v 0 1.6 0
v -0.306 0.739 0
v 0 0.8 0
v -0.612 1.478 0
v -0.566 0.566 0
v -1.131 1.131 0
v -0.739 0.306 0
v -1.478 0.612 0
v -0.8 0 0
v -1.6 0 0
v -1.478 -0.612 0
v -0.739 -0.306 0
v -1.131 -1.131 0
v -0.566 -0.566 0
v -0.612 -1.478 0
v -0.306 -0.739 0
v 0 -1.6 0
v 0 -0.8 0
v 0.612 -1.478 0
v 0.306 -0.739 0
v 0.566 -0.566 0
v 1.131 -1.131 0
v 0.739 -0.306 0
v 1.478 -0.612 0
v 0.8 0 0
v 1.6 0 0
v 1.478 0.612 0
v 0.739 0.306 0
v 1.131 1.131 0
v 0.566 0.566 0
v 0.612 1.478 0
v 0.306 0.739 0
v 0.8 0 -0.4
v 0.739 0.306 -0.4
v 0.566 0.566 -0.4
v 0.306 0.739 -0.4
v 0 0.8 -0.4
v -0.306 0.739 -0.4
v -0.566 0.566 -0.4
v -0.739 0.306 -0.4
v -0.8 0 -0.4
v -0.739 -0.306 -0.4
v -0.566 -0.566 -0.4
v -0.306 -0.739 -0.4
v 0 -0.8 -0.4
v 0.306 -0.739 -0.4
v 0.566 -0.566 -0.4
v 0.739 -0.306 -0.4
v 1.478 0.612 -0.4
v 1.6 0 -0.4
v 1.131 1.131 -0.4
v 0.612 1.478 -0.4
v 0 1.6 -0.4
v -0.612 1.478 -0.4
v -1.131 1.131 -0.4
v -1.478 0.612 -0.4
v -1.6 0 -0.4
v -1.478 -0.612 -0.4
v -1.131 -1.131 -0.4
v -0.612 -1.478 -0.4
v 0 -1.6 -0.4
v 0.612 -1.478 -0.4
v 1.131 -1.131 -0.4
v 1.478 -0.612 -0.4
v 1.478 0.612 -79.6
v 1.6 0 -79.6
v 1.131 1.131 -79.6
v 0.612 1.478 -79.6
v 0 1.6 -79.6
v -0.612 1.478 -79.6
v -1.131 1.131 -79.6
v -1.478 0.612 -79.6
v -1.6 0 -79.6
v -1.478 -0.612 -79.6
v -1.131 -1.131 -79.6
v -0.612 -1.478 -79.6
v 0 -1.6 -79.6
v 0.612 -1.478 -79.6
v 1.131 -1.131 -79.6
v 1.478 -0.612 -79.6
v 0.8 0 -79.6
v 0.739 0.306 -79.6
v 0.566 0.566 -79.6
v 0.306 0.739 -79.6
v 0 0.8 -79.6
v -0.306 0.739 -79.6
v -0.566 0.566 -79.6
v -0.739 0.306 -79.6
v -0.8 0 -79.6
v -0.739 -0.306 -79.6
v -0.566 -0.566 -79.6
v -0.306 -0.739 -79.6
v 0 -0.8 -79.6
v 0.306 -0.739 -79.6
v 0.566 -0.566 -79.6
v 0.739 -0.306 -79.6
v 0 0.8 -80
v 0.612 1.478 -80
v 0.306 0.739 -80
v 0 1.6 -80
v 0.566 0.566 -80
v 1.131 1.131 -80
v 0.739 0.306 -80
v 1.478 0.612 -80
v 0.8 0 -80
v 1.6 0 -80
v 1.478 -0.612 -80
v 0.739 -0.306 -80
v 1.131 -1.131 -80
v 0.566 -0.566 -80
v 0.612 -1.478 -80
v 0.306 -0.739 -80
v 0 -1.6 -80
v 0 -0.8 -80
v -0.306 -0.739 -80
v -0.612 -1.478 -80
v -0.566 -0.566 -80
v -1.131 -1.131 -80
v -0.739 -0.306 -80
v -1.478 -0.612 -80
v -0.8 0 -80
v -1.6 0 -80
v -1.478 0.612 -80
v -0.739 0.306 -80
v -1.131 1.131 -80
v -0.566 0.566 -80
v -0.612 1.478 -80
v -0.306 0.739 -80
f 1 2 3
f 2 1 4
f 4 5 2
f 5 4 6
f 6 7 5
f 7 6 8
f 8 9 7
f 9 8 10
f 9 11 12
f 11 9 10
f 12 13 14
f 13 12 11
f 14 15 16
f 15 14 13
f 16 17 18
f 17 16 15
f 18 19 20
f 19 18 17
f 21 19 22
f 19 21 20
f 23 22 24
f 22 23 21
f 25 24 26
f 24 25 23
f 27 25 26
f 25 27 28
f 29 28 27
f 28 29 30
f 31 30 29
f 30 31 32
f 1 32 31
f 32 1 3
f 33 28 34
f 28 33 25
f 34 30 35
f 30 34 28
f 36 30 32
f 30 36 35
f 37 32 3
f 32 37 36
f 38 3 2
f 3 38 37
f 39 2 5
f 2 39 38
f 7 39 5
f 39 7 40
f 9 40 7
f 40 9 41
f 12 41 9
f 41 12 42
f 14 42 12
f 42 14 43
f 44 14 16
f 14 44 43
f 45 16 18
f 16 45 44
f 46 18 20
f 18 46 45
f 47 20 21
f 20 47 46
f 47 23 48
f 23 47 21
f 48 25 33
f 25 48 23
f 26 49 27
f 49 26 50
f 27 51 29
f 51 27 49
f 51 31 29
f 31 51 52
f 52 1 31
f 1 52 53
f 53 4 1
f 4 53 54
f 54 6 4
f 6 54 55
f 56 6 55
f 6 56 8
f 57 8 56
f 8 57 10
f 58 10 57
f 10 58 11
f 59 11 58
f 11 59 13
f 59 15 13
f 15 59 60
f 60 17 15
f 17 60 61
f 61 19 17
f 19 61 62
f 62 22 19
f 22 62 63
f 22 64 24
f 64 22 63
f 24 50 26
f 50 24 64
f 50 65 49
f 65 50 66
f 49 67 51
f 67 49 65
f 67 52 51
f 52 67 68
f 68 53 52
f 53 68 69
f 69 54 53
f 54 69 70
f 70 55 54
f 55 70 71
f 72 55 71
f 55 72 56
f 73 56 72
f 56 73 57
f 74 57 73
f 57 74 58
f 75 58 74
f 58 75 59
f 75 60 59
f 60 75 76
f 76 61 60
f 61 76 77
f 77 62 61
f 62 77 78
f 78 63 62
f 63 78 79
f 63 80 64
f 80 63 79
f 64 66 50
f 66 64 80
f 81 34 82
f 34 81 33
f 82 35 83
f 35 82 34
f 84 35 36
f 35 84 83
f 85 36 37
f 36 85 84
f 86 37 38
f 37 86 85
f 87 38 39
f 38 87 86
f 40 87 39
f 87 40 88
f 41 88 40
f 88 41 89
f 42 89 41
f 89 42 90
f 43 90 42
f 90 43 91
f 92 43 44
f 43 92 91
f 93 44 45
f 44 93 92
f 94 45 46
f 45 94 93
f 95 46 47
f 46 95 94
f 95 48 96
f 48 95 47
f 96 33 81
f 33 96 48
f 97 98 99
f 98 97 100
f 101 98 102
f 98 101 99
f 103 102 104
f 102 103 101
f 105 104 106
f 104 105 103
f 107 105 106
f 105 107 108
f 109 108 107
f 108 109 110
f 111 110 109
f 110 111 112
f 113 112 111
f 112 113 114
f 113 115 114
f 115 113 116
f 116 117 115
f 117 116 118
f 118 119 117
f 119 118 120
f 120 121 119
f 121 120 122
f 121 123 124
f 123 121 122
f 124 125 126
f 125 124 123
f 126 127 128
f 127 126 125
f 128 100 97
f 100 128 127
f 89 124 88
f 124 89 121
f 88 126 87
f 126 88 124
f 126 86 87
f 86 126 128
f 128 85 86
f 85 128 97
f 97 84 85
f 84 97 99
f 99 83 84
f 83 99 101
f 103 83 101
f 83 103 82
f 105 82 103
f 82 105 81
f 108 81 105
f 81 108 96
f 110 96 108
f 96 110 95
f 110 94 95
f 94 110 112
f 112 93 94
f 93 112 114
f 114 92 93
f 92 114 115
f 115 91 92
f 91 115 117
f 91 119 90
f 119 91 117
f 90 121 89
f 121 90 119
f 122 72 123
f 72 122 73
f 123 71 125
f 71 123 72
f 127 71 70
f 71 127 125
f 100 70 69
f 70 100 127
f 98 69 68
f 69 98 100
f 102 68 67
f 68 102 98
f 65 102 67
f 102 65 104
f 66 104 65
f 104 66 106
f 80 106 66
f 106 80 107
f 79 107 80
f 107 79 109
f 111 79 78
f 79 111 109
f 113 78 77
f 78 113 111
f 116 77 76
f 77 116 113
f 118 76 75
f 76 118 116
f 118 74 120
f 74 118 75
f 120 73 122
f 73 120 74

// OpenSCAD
// file: ../p/4-4ring1.scad
use <../lib.scad>
function ldraw_lib__4_4ring1() = [
// 0 Ring  1 x 1.0
// 0 Name: 4-4ring1.dat
// 0 Author: James Jessiman
// 0 !LDRAW_ORG Primitive UPDATE 2009-01
// 0 !LICENSE Licensed under CC BY 4.0 : see CAreadme.txt
// 
// 0 BFC CERTIFY CCW
  [0,"BFC","CERTIFY"],
  [0,"BFC","CCW"],
// 
// 0 !HISTORY 1998-12-15 [PTadmin] Official Update 1998-10
// 0 !HISTORY 2002-04-08 [BrickCaster] Modified for BFC compliance
// 0 !HISTORY 2002-04-25 [PTadmin] Official Update 2002-02
// 0 !HISTORY 2007-06-24 [PTadmin] Header formatted for Contributor Agreement
// 0 !HISTORY 2008-07-01 [PTadmin] Official Update 2008-01
// 0 !HISTORY 2008-08-26 [cwdee] Switch polygon winding and rename
// 0 !HISTORY 2009-05-02 [PTadmin] Official Update 2009-01
// 
// 
// 4 16 -0.7654 0 1.8478 -0.3827 0 0.9239 0 0 1 0 0 2
  [4,16,-0.7654,0,1.8478,-0.3827,0,0.9239,0,0,1,0,0,2],
// 4 16 -1.4142 0 1.4142 -0.7071 0 0.7071 -0.3827 0 0.9239 -0.7654 0 1.8478
  [4,16,-1.4142,0,1.4142,-0.7071,0,0.7071,-0.3827,0,0.9239,-0.7654,0,1.8478],
// 4 16 -1.8478 0 0.7654 -0.9239 0 0.3827 -0.7071 0 0.7071 -1.4142 0 1.41420
  [4,16,-1.8478,0,0.7654,-0.9239,0,0.3827,-0.7071,0,0.7071,-1.4142,0,1.41420],
// 4 16 -2 0 0 -1 0 0 -0.9239 0 0.3827 -1.8478 0 0.7654
  [4,16,-2,0,0,-1,0,0,-0.9239,0,0.3827,-1.8478,0,0.7654],
// 4 16 -1.8478 0 -0.7654 -0.9239 0 -0.3827 -1 0 0 -2 0 0
  [4,16,-1.8478,0,-0.7654,-0.9239,0,-0.3827,-1,0,0,-2,0,0],
// 4 16 -1.4142 0 -1.4142 -0.7071 0 -0.7071 -0.9239 0 -0.3827 -1.8478 0 -0.7654
  [4,16,-1.4142,0,-1.4142,-0.7071,0,-0.7071,-0.9239,0,-0.3827,-1.8478,0,-0.7654],
// 4 16 -0.7654 0 -1.8478 -0.3827 0 -0.9239 -0.7071 0 -0.7071 -1.4142 0 -1.4142
  [4,16,-0.7654,0,-1.8478,-0.3827,0,-0.9239,-0.7071,0,-0.7071,-1.4142,0,-1.4142],
// 4 16 0 0 -2 0 0 -1 -0.3827 0 -0.9239 -0.7654 0 -1.8478
  [4,16,0,0,-2,0,0,-1,-0.3827,0,-0.9239,-0.7654,0,-1.8478],
// 4 16 0.7654 0 -1.8478 0.3827 0 -0.9239 0 0 -1 0 0 -2
  [4,16,0.7654,0,-1.8478,0.3827,0,-0.9239,0,0,-1,0,0,-2],
// 4 16 1.4142 0 -1.4142 0.7071 0 -0.7071 0.3827 0 -0.9239 0.7654 0 -1.8478
  [4,16,1.4142,0,-1.4142,0.7071,0,-0.7071,0.3827,0,-0.9239,0.7654,0,-1.8478],
// 4 16 1.8478 0 -0.7654 0.9239 0 -0.3827 0.7071 0 -0.7071 1.4142 0 -1.4142
  [4,16,1.8478,0,-0.7654,0.9239,0,-0.3827,0.7071,0,-0.7071,1.4142,0,-1.4142],
// 4 16 2 0 0 1 0 0 0.9239 0 -0.3827 1.8478 0 -0.7654
  [4,16,2,0,0,1,0,0,0.9239,0,-0.3827,1.8478,0,-0.7654],
// 4 16 1.8478 0 0.7654 0.9239 0 0.3827 1 0 0 2 0 0
  [4,16,1.8478,0,0.7654,0.9239,0,0.3827,1,0,0,2,0,0],
// 4 16 1.4142 0 1.4142 0.7071 0 0.7071 0.9239 0 0.3827 1.8478 0 0.7654
  [4,16,1.4142,0,1.4142,0.7071,0,0.7071,0.9239,0,0.3827,1.8478,0,0.7654],
// 4 16 0.7654 0 1.8478 0.3827 0 0.9239 0.7071 0 0.7071 1.4142 0 1.4142
  [4,16,0.7654,0,1.8478,0.3827,0,0.9239,0.7071,0,0.7071,1.4142,0,1.4142],
// 4 16 0 0 2 0 0 1 0.3827 0 0.9239 0.7654 0 1.8478
  [4,16,0,0,2,0,0,1,0.3827,0,0.9239,0.7654,0,1.8478],
// 0
];
module ldraw_lib__4_4ring1(step=0, col=false, unit=2/5, alt=false, line=0.2, solid=!$preview)
    makepoly(ldraw_lib__4_4ring1(), step=step, col=col, unit=unit, alt=alt, line=line, solid=solid);
ldraw_lib__4_4ring1(line=0.2);
// file: ../p/4-4edge.scad
use <../lib.scad>
function ldraw_lib__4_4edge() = [
// 0 Circle 1.0
// 0 Name: 4-4edge.dat
// 0 Author: James Jessiman
// 0 !LDRAW_ORG Primitive UPDATE 2017-01
// 0 !LICENSE Licensed under CC BY 4.0 : see CAreadme.txt
// 
// 0 BFC CERTIFY CCW
  [0,"BFC","CERTIFY"],
  [0,"BFC","CCW"],
// 
// 0 !HISTORY 1998-12-15 [PTadmin] Official Update 1998-10
// 0 !HISTORY 2005-12-28 [PTadmin] Official Update 2005-01
// 0 !HISTORY 2007-06-24 [PTadmin] Header formatted for Contributor Agreement
// 0 !HISTORY 2008-07-01 [PTadmin] Official Update 2008-01
// 0 !HISTORY 2017-01-15 [Steffen] BFCed
// 0 !HISTORY 2017-12-30 [PTadmin] Official Update 2017-01
// 
// 
// 2 24 1 0 0 0.9239 0 0.3827
  [2,24,1,0,0,0.9239,0,0.3827],
// 2 24 0.9239 0 0.3827 0.7071 0 0.7071
  [2,24,0.9239,0,0.3827,0.7071,0,0.7071],
// 2 24 0.7071 0 0.7071 0.3827 0 0.9239
  [2,24,0.7071,0,0.7071,0.3827,0,0.9239],
// 2 24 0.3827 0 0.9239 0 0 1
  [2,24,0.3827,0,0.9239,0,0,1],
// 2 24 0 0 1 -0.3827 0 0.9239
  [2,24,0,0,1,-0.3827,0,0.9239],
// 2 24 -0.3827 0 0.9239 -0.7071 0 0.7071
  [2,24,-0.3827,0,0.9239,-0.7071,0,0.7071],
// 2 24 -0.7071 0 0.7071 -0.9239 0 0.3827
  [2,24,-0.7071,0,0.7071,-0.9239,0,0.3827],
// 2 24 -0.9239 0 0.3827 -1 0 -0
  [2,24,-0.9239,0,0.3827,-1,0,-0],
// 2 24 -1 0 -0 -0.9239 0 -0.3827
  [2,24,-1,0,-0,-0.9239,0,-0.3827],
// 2 24 -0.9239 0 -0.3827 -0.7071 0 -0.7071
  [2,24,-0.9239,0,-0.3827,-0.7071,0,-0.7071],
// 2 24 -0.7071 0 -0.7071 -0.3827 0 -0.9239
  [2,24,-0.7071,0,-0.7071,-0.3827,0,-0.9239],
// 2 24 -0.3827 0 -0.9239 0 0 -1
  [2,24,-0.3827,0,-0.9239,0,0,-1],
// 2 24 0 0 -1 0.3827 0 -0.9239
  [2,24,0,0,-1,0.3827,0,-0.9239],
// 2 24 0.3827 0 -0.9239 0.7071 0 -0.7071
  [2,24,0.3827,0,-0.9239,0.7071,0,-0.7071],
// 2 24 0.7071 0 -0.7071 0.9239 0 -0.3827
  [2,24,0.7071,0,-0.7071,0.9239,0,-0.3827],
// 2 24 0.9239 0 -0.3827 1 0 0
  [2,24,0.9239,0,-0.3827,1,0,0],
];
module ldraw_lib__4_4edge(step=0, col=false, unit=2/5, alt=false, line=0.2, solid=!$preview)
    makepoly(ldraw_lib__4_4edge(), step=step, col=col, unit=unit, alt=alt, line=line, solid=solid);
ldraw_lib__4_4edge(line=0.2);
// file: ../p/4-4cyli.scad
use <../lib.scad>
function ldraw_lib__4_4cyli() = [
// 0 Cylinder 1.0
// 0 Name: 4-4cyli.dat
// 0 Author: James Jessiman
// 0 !LDRAW_ORG Primitive UPDATE 2005-01
// 0 !LICENSE Licensed under CC BY 4.0 : see CAreadme.txt
// 
// 0 BFC CERTIFY CCW
  [0,"BFC","CERTIFY"],
  [0,"BFC","CCW"],
// 
// 0 !HISTORY 1998-12-15 [PTadmin] Official Update 1998-10
// 0 !HISTORY 2002-03-23 [sbliss] Added BFC statement; merged headers from files in distributions LDraw 0.27 and Complete.
// 0 !HISTORY 2002-04-25 [PTadmin] Official Update 2002-02
// 0 !HISTORY 2004-12-14 [guyvivan] BFC CCW
// 0 !HISTORY 2005-12-28 [PTadmin] Official Update 2005-01
// 0 !HISTORY 2007-06-24 [PTadmin] Header formatted for Contributor Agreement
// 0 !HISTORY 2008-07-01 [PTadmin] Official Update 2008-01
// 
// 
// 4 16 1 1 0 0.9239 1 0.3827 0.9239 0 0.3827 1 0 0
  [4,16,1,1,0,0.9239,1,0.3827,0.9239,0,0.3827,1,0,0],
// 5 24 1 0 0 1 1 0 0.9239 0 0.3827 0.9239 0 -0.3827
  [5,24,1,0,0,1,1,0,0.9239,0,0.3827,0.9239,0,-0.3827],
// 4 16 0.9239 1 0.3827 0.7071 1 0.7071 0.7071 0 0.7071 0.9239 0 0.3827
  [4,16,0.9239,1,0.3827,0.7071,1,0.7071,0.7071,0,0.7071,0.9239,0,0.3827],
// 5 24 0.9239 0 0.3827 0.9239 1 0.3827 0.7071 0 0.7071 1 0 0
  [5,24,0.9239,0,0.3827,0.9239,1,0.3827,0.7071,0,0.7071,1,0,0],
// 4 16 0.7071 1 0.7071 0.3827 1 0.9239 0.3827 0 0.9239 0.7071 0 0.7071
  [4,16,0.7071,1,0.7071,0.3827,1,0.9239,0.3827,0,0.9239,0.7071,0,0.7071],
// 5 24 0.7071 0 0.7071 0.7071 1 0.7071 0.3827 0 0.9239 0.9239 0 0.3827
  [5,24,0.7071,0,0.7071,0.7071,1,0.7071,0.3827,0,0.9239,0.9239,0,0.3827],
// 4 16 0.3827 1 0.9239 0 1 1 0 0 1 0.3827 0 0.9239
  [4,16,0.3827,1,0.9239,0,1,1,0,0,1,0.3827,0,0.9239],
// 5 24 0.3827 0 0.9239 0.3827 1 0.9239 0 0 1 0.7071 0 0.7071
  [5,24,0.3827,0,0.9239,0.3827,1,0.9239,0,0,1,0.7071,0,0.7071],
// 4 16 0 1 1 -0.3827 1 0.9239 -0.3827 0 0.9239 0 0 1
  [4,16,0,1,1,-0.3827,1,0.9239,-0.3827,0,0.9239,0,0,1],
// 5 24 0 0 1 0 1 1 -0.3827 0 0.9239 0.3827 0 0.9239
  [5,24,0,0,1,0,1,1,-0.3827,0,0.9239,0.3827,0,0.9239],
// 4 16 -0.3827 1 0.9239 -0.7071 1 0.7071 -0.7071 0 0.7071 -0.3827 0 0.9239
  [4,16,-0.3827,1,0.9239,-0.7071,1,0.7071,-0.7071,0,0.7071,-0.3827,0,0.9239],
// 5 24 -0.3827 0 0.9239 -0.3827 1 0.9239 -0.7071 0 0.7071 0 0 1
  [5,24,-0.3827,0,0.9239,-0.3827,1,0.9239,-0.7071,0,0.7071,0,0,1],
// 4 16 -0.7071 1 0.7071 -0.9239 1 0.3827 -0.9239 0 0.3827 -0.7071 0 0.7071
  [4,16,-0.7071,1,0.7071,-0.9239,1,0.3827,-0.9239,0,0.3827,-0.7071,0,0.7071],
// 5 24 -0.7071 0 0.7071 -0.7071 1 0.7071 -0.9239 0 0.3827 -0.3827 0 0.9239
  [5,24,-0.7071,0,0.7071,-0.7071,1,0.7071,-0.9239,0,0.3827,-0.3827,0,0.9239],
// 4 16 -0.9239 1 0.3827 -1 1 0 -1 0 0 -0.9239 0 0.3827
  [4,16,-0.9239,1,0.3827,-1,1,0,-1,0,0,-0.9239,0,0.3827],
// 5 24 -0.9239 0 0.3827 -0.9239 1 0.3827 -1 0 0 -0.7071 0 0.7071
  [5,24,-0.9239,0,0.3827,-0.9239,1,0.3827,-1,0,0,-0.7071,0,0.7071],
// 4 16 -1 1 0 -0.9239 1 -0.3827 -0.9239 0 -0.3827 -1 0 0
  [4,16,-1,1,0,-0.9239,1,-0.3827,-0.9239,0,-0.3827,-1,0,0],
// 5 24 -1 0 0 -1 1 0 -0.9239 0 -0.3827 -0.9239 0 0.3827
  [5,24,-1,0,0,-1,1,0,-0.9239,0,-0.3827,-0.9239,0,0.3827],
// 4 16 -0.9239 1 -0.3827 -0.7071 1 -0.7071 -0.7071 0 -0.7071 -0.9239 0 -0.3827
  [4,16,-0.9239,1,-0.3827,-0.7071,1,-0.7071,-0.7071,0,-0.7071,-0.9239,0,-0.3827],
// 5 24 -0.9239 0 -0.3827 -0.9239 1 -0.3827 -0.7071 0 -0.7071 -1 0 0
  [5,24,-0.9239,0,-0.3827,-0.9239,1,-0.3827,-0.7071,0,-0.7071,-1,0,0],
// 4 16 -0.7071 1 -0.7071 -0.3827 1 -0.9239 -0.3827 0 -0.9239 -0.7071 0 -0.7071
  [4,16,-0.7071,1,-0.7071,-0.3827,1,-0.9239,-0.3827,0,-0.9239,-0.7071,0,-0.7071],
// 5 24 -0.7071 0 -0.7071 -0.7071 1 -0.7071 -0.3827 0 -0.9239 -0.9239 0 -0.3827
  [5,24,-0.7071,0,-0.7071,-0.7071,1,-0.7071,-0.3827,0,-0.9239,-0.9239,0,-0.3827],
// 4 16 -0.3827 1 -0.9239 0 1 -1 0 0 -1 -0.3827 0 -0.9239
  [4,16,-0.3827,1,-0.9239,0,1,-1,0,0,-1,-0.3827,0,-0.9239],
// 5 24 -0.3827 0 -0.9239 -0.3827 1 -0.9239 0 0 -1 -0.7071 0 -0.7071
  [5,24,-0.3827,0,-0.9239,-0.3827,1,-0.9239,0,0,-1,-0.7071,0,-0.7071],
// 4 16 0 1 -1 0.3827 1 -0.9239 0.3827 0 -0.9239 0 0 -1
  [4,16,0,1,-1,0.3827,1,-0.9239,0.3827,0,-0.9239,0,0,-1],
// 5 24 0 0 -1 0 1 -1 0.3827 0 -0.9239 -0.3827 0 -0.9239
  [5,24,0,0,-1,0,1,-1,0.3827,0,-0.9239,-0.3827,0,-0.9239],
// 4 16 0.3827 1 -0.9239 0.7071 1 -0.7071 0.7071 0 -0.7071 0.3827 0 -0.9239
  [4,16,0.3827,1,-0.9239,0.7071,1,-0.7071,0.7071,0,-0.7071,0.3827,0,-0.9239],
// 5 24 0.3827 0 -0.9239 0.3827 1 -0.9239 0.7071 0 -0.7071 0 0 -1
  [5,24,0.3827,0,-0.9239,0.3827,1,-0.9239,0.7071,0,-0.7071,0,0,-1],
// 4 16 0.7071 1 -0.7071 0.9239 1 -0.3827 0.9239 0 -0.3827 0.7071 0 -0.7071
  [4,16,0.7071,1,-0.7071,0.9239,1,-0.3827,0.9239,0,-0.3827,0.7071,0,-0.7071],
// 5 24 0.7071 0 -0.7071 0.7071 1 -0.7071 0.9239 0 -0.3827 0.3827 0 -0.9239
  [5,24,0.7071,0,-0.7071,0.7071,1,-0.7071,0.9239,0,-0.3827,0.3827,0,-0.9239],
// 4 16 0.9239 1 -0.3827 1 1 0 1 0 0 0.9239 0 -0.3827
  [4,16,0.9239,1,-0.3827,1,1,0,1,0,0,0.9239,0,-0.3827],
// 5 24 0.9239 0 -0.3827 0.9239 1 -0.3827 1 0 0 0.7071 0 -0.7071
  [5,24,0.9239,0,-0.3827,0.9239,1,-0.3827,1,0,0,0.7071,0,-0.7071],
// 0
];
module ldraw_lib__4_4cyli(step=0, col=false, unit=2/5, alt=false, line=0.2, solid=!$preview)
    makepoly(ldraw_lib__4_4cyli(), step=step, col=col, unit=unit, alt=alt, line=line, solid=solid);
ldraw_lib__4_4cyli(line=0.2);
// file: u9053.scad
use <../lib.scad>
use <../p/4-4cyli.scad>
use <../p/4-4edge.scad>
use <../p/4-4ring1.scad>
function ldraw_lib__u9053() = [
// 0 ~Technic Flex-System Hose End
// 0 Name: u9053.dat
// 0 Author: William Howard [WilliamH]
// 0 !LDRAW_ORG Part UPDATE 2011-02
// 0 !LICENSE Licensed under CC BY 2.0 and CC BY 4.0 : see CAreadme.txt
// 
// 0 BFC CERTIFY CCW
  [0,"BFC","CERTIFY"],
  [0,"BFC","CCW"],
// 
// 0 !HISTORY 2011-12-21 [cwdee] Reworked subparting technique
// 0 !HISTORY 2011-12-23 [PTadmin] Renamed from 76
// 0 !HISTORY 2011-12-29 [PTadmin] Official Update 2011-02
// 
// 
// 1 16 0 0 0 2 0 0 0 1 0 0 0 2 4-4ring1.dat
  [1,16,0,0,0,2,0,0,0,1,0,0,0,2, ldraw_lib__4_4ring1()],
// 1 16 0 0 0 2 0 0 0 1 0 0 0 2 4-4edge.dat
  [1,16,0,0,0,2,0,0,0,1,0,0,0,2, ldraw_lib__4_4edge()],
// 0 BFC INVERTNEXT
  [0,"BFC","INVERTNEXT"],
// 1 16 0 0 0 2 0 0 0 1 0 0 0 2 4-4cyli.dat
  [1,16,0,0,0,2,0,0,0,1,0,0,0,2, ldraw_lib__4_4cyli()],
// 1 16 0 0 0 4 0 0 0 1 0 0 0 4 4-4edge.dat
  [1,16,0,0,0,4,0,0,0,1,0,0,0,4, ldraw_lib__4_4edge()],
// 1 16 0 0 0 4 0 0 0 1 0 0 0 4 4-4cyli.dat
  [1,16,0,0,0,4,0,0,0,1,0,0,0,4, ldraw_lib__4_4cyli()],
// 0
];
module ldraw_lib__u9053(step=0, col=false, unit=2/5, alt=false, line=0.2, solid=!$preview)
    makepoly(ldraw_lib__u9053(), step=step, col=col, unit=unit, alt=alt, line=line, solid=solid);
ldraw_lib__u9053(line=0.2);
// file: 77.scad
use <../lib.scad>
use <../p/4-4cyli.scad>
function ldraw_lib__77() = [
// 0 ~Technic Flex-System Hose Segment
// 0 Name: 77.dat
// 0 Author: William Howard [WilliamH]
// 0 !LDRAW_ORG Part UPDATE 2011-02
// 0 !LICENSE Licensed under CC BY 2.0 and CC BY 4.0 : see CAreadme.txt
// 
// 0 BFC CERTIFY CCW
  [0,"BFC","CERTIFY"],
  [0,"BFC","CCW"],
// 
// 0 !HISTORY 2011-12-21 [cwdee] Reworked subparting technique
// 0 !HISTORY 2011-12-29 [PTadmin] Official Update 2011-02
// 
// 
// 1 16 0 0 0 4 0 0 0 1 0 0 0 4 4-4cyli.dat
  [1,16,0,0,0,4,0,0,0,1,0,0,0,4, ldraw_lib__4_4cyli()],
// 0 BFC INVERTNEXT
  [0,"BFC","INVERTNEXT"],
// 1 16 0 0 0 2 0 0 0 1 0 0 0 2 4-4cyli.dat
  [1,16,0,0,0,2,0,0,0,1,0,0,0,2, ldraw_lib__4_4cyli()],
// 0
];
module ldraw_lib__77(step=0, col=false, unit=2/5, alt=false, line=0.2, solid=!$preview)
    makepoly(ldraw_lib__77(), step=step, col=col, unit=unit, alt=alt, line=line, solid=solid);
ldraw_lib__77(line=0.2);
// main file
use <../lib.scad>
use <77.scad>
use <u9053.scad>
function ldraw_lib__76348() = [
// 0 Technic Flex-System Hose 10L (200LDU)
// 0 Name: 76348.dat
// 0 Author: Tim Gould [timgould]
// 0 !LDRAW_ORG Part UPDATE 2011-02
// 0 !LICENSE Licensed under CC BY 4.0 : see CAreadme.txt
// 
// 0 BFC CERTIFY CCW
  [0,"BFC","CERTIFY"],
  [0,"BFC","CCW"],
// 
// 0 !KEYWORDS bar, BrickLink 75c10, Rebrickable 75c10, tube
// 
// 0 !HISTORY 2011-12-29 [PTadmin] Official Update 2011-02
// 
// 
// 1 16 0 0 0 1 0 0 0 1 0 0 0 1 u9053.dat
  [1,16,0,0,0,1,0,0,0,1,0,0,0,1, ldraw_lib__u9053()],
// 1 16 0 1 0 1 0 0 0 198 0 0 0 1 77.dat
  [1,16,0,1,0,1,0,0,0,198,0,0,0,1, ldraw_lib__77()],
// 1 16 0 200 0 -1 0 0 0 -1 0 0 0 1 u9053.dat
  [1,16,0,200,0,-1,0,0,0,-1,0,0,0,1, ldraw_lib__u9053()],
];
module ldraw_lib__76348(step=0, col=false, unit=2/5, alt=false, line=0.2, solid=!$preview)
    makepoly(ldraw_lib__76348(), step=step, col=col, unit=unit, alt=alt, line=line, solid=solid);
ldraw_lib__76348(line=0.2);
